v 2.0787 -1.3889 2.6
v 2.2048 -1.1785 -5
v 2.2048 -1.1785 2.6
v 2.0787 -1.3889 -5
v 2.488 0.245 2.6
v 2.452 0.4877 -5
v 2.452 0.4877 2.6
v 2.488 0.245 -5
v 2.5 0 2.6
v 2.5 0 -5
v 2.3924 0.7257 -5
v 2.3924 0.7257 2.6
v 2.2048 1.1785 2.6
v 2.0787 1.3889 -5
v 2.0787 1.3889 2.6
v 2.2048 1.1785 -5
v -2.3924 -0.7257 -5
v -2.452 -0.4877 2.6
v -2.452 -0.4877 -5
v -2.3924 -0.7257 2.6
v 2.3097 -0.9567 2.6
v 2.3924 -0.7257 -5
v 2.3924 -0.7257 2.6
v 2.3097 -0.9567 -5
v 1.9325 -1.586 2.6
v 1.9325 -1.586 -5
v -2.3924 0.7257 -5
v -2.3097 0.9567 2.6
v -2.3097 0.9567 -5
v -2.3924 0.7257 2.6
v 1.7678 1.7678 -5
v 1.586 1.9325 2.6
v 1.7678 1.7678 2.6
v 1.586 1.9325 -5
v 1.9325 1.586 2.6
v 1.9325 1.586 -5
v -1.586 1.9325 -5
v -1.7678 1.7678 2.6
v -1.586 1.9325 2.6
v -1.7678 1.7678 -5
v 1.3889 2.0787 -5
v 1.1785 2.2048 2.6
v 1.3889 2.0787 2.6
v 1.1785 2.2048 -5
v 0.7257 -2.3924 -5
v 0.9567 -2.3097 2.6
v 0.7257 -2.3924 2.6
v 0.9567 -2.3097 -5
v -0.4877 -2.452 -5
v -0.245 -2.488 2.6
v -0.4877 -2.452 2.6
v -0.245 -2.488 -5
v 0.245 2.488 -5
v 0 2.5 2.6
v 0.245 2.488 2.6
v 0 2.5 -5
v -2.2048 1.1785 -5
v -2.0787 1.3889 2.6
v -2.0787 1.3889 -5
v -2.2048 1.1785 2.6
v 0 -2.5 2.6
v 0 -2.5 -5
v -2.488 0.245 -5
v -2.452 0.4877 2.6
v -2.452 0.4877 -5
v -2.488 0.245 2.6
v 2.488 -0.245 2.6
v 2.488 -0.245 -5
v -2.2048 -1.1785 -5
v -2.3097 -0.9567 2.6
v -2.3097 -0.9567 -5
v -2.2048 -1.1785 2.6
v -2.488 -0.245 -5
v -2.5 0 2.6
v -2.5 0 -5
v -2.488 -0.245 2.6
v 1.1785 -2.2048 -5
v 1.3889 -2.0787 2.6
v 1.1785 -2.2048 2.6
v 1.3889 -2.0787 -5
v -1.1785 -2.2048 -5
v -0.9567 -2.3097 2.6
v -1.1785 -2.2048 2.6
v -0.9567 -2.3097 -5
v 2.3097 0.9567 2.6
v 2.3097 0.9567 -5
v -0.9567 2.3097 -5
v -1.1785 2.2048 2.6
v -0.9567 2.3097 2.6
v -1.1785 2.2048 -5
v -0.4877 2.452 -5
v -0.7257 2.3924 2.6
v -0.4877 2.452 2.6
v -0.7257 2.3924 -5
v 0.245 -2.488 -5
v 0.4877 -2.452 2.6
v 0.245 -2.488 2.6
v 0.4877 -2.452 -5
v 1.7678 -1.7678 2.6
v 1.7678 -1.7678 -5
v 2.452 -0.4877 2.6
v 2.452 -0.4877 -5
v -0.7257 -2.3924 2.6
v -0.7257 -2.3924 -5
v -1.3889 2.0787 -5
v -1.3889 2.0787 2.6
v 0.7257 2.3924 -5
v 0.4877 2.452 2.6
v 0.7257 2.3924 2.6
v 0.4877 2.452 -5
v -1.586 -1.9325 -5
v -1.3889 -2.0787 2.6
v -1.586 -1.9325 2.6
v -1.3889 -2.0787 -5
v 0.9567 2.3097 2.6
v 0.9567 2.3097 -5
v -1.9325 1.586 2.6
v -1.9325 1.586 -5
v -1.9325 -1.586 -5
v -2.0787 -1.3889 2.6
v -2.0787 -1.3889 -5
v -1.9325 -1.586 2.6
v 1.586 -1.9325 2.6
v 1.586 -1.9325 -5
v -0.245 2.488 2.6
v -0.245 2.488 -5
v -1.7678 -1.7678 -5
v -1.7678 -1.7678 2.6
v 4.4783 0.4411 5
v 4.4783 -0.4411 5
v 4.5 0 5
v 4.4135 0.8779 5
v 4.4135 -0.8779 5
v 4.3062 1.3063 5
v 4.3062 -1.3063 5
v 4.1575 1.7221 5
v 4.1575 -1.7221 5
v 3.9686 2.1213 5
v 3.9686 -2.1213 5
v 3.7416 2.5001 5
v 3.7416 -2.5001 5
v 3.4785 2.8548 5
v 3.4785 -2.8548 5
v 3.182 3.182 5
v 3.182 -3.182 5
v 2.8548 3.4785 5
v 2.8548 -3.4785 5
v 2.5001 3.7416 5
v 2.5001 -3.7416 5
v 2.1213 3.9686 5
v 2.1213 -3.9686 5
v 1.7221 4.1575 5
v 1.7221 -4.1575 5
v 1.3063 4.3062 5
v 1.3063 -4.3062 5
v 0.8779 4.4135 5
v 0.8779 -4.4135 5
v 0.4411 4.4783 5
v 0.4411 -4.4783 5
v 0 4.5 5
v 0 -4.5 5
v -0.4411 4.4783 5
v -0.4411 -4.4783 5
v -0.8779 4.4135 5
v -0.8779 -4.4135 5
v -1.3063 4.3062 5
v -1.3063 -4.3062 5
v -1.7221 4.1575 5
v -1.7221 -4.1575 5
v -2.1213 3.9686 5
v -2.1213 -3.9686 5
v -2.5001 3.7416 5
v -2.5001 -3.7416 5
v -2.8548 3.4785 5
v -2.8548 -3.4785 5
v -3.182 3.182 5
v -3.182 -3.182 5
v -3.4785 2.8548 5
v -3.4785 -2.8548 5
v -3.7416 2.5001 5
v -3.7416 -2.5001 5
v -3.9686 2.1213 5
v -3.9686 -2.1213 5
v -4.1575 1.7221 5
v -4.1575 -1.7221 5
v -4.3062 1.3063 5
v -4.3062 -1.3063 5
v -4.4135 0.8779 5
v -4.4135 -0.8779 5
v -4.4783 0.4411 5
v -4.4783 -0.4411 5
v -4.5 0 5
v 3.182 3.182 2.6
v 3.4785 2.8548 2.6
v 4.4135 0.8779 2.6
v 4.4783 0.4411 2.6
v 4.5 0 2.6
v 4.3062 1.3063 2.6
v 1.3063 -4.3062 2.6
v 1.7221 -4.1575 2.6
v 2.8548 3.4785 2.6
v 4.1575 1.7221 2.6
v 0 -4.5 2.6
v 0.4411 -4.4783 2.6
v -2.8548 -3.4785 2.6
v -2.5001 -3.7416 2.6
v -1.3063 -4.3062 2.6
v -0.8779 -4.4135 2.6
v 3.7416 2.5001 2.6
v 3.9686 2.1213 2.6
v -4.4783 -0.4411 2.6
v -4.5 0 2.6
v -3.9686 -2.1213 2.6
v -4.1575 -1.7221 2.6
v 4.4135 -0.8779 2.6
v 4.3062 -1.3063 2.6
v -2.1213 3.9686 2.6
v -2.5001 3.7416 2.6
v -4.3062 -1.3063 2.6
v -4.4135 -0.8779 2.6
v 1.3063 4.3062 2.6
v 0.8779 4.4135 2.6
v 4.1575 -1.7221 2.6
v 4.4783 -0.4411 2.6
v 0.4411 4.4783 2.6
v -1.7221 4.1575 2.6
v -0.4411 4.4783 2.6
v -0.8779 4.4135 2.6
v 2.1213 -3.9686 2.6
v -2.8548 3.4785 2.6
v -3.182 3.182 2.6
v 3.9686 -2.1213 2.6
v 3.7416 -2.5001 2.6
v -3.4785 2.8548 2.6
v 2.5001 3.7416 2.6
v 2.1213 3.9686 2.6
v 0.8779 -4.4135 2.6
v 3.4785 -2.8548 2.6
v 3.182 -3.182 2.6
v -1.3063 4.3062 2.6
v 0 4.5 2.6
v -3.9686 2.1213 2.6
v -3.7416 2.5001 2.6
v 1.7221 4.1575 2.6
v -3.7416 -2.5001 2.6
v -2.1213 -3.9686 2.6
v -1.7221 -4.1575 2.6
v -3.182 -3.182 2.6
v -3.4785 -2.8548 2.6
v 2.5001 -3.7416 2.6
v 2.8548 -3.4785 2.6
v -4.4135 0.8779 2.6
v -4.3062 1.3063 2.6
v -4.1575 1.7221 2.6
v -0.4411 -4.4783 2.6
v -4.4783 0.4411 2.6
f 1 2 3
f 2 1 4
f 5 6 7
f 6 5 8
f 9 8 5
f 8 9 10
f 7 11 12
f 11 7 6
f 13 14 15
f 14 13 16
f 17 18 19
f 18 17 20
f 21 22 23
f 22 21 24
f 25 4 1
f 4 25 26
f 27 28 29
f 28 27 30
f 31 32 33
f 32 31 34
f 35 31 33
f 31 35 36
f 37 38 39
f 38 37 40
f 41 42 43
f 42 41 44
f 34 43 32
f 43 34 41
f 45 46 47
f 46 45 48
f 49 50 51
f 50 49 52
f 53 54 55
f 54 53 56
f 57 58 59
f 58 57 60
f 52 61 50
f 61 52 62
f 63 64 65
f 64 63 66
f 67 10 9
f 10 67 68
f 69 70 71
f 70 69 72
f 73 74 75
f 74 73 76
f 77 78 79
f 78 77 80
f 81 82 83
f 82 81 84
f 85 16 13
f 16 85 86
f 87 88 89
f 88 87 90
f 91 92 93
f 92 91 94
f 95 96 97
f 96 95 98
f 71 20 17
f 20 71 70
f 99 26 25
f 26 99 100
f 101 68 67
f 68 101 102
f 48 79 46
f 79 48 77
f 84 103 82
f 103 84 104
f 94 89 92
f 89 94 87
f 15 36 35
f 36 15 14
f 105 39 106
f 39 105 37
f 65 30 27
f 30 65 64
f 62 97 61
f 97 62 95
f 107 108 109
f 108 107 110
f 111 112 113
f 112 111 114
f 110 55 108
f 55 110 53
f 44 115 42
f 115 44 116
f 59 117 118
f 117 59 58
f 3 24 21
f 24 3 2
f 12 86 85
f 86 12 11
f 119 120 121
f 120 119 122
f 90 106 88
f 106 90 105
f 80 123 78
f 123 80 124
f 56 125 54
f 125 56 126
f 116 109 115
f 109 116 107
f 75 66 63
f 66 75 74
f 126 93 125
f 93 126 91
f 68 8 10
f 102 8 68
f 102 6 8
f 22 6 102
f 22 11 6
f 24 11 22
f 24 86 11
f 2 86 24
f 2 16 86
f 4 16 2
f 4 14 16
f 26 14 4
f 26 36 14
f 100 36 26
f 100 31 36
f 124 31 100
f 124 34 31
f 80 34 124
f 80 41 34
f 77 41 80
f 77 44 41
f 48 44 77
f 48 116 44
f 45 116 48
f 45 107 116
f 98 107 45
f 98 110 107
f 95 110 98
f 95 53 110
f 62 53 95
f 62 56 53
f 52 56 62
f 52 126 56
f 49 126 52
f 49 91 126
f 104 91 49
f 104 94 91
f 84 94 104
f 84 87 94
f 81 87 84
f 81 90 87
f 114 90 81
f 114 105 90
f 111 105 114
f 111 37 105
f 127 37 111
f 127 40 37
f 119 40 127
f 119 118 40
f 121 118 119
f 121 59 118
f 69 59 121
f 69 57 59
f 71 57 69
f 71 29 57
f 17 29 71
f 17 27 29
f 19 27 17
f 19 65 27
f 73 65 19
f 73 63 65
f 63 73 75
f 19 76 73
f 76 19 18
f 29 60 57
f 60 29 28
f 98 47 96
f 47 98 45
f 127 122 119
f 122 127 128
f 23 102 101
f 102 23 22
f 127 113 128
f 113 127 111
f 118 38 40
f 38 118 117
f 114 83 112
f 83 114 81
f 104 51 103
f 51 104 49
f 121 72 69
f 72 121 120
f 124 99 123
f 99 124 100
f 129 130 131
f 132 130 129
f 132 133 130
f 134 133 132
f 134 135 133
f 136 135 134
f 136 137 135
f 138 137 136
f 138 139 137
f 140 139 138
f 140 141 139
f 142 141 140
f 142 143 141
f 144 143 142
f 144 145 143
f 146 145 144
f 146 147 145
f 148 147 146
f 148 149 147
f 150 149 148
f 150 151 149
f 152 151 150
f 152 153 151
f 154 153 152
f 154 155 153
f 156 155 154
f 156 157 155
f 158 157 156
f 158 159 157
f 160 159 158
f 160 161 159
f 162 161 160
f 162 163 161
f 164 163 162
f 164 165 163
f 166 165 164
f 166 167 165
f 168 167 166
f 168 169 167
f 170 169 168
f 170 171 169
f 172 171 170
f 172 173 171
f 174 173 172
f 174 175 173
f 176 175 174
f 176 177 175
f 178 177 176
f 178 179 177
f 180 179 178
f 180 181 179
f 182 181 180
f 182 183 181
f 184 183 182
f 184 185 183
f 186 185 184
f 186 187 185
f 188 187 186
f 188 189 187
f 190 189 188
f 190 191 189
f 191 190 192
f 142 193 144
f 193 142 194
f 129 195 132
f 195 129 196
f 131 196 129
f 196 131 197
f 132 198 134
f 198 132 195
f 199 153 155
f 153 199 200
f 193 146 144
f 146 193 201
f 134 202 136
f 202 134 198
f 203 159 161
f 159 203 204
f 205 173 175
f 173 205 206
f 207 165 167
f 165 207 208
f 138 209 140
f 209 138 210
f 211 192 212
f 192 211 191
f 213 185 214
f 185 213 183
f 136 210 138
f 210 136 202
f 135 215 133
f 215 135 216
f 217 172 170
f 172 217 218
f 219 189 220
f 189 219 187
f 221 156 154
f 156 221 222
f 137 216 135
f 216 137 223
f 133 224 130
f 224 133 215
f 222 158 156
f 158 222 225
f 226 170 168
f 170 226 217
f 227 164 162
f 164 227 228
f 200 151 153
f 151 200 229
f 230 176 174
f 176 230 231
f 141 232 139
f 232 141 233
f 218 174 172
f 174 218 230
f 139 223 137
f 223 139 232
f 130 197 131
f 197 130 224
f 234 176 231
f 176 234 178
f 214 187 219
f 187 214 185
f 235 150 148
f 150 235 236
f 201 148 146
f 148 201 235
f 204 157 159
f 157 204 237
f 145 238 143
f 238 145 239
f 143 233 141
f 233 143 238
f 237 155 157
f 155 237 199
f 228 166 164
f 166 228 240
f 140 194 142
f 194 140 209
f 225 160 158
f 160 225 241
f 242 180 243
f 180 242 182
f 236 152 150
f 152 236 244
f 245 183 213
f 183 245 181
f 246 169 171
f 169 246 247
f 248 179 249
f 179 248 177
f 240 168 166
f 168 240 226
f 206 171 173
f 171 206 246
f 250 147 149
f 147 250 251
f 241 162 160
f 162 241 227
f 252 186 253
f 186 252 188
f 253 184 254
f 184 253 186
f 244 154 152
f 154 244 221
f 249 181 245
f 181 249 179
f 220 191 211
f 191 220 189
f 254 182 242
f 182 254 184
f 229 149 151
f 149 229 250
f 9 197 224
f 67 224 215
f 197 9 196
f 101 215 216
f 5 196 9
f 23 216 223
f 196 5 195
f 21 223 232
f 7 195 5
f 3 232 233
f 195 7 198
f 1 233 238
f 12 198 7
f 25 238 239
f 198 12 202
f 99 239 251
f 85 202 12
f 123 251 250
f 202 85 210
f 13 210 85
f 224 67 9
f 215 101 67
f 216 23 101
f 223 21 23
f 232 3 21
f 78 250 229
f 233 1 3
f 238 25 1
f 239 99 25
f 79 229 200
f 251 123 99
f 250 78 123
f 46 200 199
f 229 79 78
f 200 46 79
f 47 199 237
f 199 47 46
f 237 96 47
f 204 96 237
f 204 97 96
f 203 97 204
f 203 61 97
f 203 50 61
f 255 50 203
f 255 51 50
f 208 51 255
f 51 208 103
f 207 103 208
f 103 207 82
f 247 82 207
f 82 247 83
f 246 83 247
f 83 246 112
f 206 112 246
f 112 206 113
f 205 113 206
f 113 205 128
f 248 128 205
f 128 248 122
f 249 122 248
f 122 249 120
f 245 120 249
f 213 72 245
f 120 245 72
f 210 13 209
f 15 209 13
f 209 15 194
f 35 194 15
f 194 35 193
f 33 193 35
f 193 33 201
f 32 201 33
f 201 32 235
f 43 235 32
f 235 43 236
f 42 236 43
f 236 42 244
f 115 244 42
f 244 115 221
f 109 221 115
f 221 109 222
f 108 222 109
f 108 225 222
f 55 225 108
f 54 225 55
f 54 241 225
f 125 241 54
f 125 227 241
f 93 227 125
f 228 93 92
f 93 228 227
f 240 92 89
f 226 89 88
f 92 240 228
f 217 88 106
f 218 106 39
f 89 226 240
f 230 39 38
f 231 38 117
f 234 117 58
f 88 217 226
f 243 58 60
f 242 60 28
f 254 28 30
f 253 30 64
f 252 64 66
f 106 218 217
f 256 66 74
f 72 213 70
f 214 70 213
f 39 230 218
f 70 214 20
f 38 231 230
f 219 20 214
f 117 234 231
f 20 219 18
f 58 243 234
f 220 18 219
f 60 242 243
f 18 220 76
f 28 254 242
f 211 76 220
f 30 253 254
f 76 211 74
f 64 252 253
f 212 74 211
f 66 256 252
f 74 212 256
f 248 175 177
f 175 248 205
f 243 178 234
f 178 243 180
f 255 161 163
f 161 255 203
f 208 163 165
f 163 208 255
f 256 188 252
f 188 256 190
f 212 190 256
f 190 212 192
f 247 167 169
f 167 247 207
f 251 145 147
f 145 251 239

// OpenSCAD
$fn=64;

shaft_d = 5.0;
shaft_r = shaft_d/2;
length = 10.0;

head_d = 9.0;
head_r = head_d/2;
head_h = 2.4;

module screw_shaft(d, h){
    cylinder(d=d, h=h, center=false);
}

module screw_head(d, h){
    cylinder(d=d, h=h, center=false);
}

module screw(){
    union(){
        translate([0,0,-length/2])
            screw_shaft(shaft_d, length);
        translate([0,0,length/2 - head_h])
            screw_head(head_d, head_h);
    }
}

screw();
